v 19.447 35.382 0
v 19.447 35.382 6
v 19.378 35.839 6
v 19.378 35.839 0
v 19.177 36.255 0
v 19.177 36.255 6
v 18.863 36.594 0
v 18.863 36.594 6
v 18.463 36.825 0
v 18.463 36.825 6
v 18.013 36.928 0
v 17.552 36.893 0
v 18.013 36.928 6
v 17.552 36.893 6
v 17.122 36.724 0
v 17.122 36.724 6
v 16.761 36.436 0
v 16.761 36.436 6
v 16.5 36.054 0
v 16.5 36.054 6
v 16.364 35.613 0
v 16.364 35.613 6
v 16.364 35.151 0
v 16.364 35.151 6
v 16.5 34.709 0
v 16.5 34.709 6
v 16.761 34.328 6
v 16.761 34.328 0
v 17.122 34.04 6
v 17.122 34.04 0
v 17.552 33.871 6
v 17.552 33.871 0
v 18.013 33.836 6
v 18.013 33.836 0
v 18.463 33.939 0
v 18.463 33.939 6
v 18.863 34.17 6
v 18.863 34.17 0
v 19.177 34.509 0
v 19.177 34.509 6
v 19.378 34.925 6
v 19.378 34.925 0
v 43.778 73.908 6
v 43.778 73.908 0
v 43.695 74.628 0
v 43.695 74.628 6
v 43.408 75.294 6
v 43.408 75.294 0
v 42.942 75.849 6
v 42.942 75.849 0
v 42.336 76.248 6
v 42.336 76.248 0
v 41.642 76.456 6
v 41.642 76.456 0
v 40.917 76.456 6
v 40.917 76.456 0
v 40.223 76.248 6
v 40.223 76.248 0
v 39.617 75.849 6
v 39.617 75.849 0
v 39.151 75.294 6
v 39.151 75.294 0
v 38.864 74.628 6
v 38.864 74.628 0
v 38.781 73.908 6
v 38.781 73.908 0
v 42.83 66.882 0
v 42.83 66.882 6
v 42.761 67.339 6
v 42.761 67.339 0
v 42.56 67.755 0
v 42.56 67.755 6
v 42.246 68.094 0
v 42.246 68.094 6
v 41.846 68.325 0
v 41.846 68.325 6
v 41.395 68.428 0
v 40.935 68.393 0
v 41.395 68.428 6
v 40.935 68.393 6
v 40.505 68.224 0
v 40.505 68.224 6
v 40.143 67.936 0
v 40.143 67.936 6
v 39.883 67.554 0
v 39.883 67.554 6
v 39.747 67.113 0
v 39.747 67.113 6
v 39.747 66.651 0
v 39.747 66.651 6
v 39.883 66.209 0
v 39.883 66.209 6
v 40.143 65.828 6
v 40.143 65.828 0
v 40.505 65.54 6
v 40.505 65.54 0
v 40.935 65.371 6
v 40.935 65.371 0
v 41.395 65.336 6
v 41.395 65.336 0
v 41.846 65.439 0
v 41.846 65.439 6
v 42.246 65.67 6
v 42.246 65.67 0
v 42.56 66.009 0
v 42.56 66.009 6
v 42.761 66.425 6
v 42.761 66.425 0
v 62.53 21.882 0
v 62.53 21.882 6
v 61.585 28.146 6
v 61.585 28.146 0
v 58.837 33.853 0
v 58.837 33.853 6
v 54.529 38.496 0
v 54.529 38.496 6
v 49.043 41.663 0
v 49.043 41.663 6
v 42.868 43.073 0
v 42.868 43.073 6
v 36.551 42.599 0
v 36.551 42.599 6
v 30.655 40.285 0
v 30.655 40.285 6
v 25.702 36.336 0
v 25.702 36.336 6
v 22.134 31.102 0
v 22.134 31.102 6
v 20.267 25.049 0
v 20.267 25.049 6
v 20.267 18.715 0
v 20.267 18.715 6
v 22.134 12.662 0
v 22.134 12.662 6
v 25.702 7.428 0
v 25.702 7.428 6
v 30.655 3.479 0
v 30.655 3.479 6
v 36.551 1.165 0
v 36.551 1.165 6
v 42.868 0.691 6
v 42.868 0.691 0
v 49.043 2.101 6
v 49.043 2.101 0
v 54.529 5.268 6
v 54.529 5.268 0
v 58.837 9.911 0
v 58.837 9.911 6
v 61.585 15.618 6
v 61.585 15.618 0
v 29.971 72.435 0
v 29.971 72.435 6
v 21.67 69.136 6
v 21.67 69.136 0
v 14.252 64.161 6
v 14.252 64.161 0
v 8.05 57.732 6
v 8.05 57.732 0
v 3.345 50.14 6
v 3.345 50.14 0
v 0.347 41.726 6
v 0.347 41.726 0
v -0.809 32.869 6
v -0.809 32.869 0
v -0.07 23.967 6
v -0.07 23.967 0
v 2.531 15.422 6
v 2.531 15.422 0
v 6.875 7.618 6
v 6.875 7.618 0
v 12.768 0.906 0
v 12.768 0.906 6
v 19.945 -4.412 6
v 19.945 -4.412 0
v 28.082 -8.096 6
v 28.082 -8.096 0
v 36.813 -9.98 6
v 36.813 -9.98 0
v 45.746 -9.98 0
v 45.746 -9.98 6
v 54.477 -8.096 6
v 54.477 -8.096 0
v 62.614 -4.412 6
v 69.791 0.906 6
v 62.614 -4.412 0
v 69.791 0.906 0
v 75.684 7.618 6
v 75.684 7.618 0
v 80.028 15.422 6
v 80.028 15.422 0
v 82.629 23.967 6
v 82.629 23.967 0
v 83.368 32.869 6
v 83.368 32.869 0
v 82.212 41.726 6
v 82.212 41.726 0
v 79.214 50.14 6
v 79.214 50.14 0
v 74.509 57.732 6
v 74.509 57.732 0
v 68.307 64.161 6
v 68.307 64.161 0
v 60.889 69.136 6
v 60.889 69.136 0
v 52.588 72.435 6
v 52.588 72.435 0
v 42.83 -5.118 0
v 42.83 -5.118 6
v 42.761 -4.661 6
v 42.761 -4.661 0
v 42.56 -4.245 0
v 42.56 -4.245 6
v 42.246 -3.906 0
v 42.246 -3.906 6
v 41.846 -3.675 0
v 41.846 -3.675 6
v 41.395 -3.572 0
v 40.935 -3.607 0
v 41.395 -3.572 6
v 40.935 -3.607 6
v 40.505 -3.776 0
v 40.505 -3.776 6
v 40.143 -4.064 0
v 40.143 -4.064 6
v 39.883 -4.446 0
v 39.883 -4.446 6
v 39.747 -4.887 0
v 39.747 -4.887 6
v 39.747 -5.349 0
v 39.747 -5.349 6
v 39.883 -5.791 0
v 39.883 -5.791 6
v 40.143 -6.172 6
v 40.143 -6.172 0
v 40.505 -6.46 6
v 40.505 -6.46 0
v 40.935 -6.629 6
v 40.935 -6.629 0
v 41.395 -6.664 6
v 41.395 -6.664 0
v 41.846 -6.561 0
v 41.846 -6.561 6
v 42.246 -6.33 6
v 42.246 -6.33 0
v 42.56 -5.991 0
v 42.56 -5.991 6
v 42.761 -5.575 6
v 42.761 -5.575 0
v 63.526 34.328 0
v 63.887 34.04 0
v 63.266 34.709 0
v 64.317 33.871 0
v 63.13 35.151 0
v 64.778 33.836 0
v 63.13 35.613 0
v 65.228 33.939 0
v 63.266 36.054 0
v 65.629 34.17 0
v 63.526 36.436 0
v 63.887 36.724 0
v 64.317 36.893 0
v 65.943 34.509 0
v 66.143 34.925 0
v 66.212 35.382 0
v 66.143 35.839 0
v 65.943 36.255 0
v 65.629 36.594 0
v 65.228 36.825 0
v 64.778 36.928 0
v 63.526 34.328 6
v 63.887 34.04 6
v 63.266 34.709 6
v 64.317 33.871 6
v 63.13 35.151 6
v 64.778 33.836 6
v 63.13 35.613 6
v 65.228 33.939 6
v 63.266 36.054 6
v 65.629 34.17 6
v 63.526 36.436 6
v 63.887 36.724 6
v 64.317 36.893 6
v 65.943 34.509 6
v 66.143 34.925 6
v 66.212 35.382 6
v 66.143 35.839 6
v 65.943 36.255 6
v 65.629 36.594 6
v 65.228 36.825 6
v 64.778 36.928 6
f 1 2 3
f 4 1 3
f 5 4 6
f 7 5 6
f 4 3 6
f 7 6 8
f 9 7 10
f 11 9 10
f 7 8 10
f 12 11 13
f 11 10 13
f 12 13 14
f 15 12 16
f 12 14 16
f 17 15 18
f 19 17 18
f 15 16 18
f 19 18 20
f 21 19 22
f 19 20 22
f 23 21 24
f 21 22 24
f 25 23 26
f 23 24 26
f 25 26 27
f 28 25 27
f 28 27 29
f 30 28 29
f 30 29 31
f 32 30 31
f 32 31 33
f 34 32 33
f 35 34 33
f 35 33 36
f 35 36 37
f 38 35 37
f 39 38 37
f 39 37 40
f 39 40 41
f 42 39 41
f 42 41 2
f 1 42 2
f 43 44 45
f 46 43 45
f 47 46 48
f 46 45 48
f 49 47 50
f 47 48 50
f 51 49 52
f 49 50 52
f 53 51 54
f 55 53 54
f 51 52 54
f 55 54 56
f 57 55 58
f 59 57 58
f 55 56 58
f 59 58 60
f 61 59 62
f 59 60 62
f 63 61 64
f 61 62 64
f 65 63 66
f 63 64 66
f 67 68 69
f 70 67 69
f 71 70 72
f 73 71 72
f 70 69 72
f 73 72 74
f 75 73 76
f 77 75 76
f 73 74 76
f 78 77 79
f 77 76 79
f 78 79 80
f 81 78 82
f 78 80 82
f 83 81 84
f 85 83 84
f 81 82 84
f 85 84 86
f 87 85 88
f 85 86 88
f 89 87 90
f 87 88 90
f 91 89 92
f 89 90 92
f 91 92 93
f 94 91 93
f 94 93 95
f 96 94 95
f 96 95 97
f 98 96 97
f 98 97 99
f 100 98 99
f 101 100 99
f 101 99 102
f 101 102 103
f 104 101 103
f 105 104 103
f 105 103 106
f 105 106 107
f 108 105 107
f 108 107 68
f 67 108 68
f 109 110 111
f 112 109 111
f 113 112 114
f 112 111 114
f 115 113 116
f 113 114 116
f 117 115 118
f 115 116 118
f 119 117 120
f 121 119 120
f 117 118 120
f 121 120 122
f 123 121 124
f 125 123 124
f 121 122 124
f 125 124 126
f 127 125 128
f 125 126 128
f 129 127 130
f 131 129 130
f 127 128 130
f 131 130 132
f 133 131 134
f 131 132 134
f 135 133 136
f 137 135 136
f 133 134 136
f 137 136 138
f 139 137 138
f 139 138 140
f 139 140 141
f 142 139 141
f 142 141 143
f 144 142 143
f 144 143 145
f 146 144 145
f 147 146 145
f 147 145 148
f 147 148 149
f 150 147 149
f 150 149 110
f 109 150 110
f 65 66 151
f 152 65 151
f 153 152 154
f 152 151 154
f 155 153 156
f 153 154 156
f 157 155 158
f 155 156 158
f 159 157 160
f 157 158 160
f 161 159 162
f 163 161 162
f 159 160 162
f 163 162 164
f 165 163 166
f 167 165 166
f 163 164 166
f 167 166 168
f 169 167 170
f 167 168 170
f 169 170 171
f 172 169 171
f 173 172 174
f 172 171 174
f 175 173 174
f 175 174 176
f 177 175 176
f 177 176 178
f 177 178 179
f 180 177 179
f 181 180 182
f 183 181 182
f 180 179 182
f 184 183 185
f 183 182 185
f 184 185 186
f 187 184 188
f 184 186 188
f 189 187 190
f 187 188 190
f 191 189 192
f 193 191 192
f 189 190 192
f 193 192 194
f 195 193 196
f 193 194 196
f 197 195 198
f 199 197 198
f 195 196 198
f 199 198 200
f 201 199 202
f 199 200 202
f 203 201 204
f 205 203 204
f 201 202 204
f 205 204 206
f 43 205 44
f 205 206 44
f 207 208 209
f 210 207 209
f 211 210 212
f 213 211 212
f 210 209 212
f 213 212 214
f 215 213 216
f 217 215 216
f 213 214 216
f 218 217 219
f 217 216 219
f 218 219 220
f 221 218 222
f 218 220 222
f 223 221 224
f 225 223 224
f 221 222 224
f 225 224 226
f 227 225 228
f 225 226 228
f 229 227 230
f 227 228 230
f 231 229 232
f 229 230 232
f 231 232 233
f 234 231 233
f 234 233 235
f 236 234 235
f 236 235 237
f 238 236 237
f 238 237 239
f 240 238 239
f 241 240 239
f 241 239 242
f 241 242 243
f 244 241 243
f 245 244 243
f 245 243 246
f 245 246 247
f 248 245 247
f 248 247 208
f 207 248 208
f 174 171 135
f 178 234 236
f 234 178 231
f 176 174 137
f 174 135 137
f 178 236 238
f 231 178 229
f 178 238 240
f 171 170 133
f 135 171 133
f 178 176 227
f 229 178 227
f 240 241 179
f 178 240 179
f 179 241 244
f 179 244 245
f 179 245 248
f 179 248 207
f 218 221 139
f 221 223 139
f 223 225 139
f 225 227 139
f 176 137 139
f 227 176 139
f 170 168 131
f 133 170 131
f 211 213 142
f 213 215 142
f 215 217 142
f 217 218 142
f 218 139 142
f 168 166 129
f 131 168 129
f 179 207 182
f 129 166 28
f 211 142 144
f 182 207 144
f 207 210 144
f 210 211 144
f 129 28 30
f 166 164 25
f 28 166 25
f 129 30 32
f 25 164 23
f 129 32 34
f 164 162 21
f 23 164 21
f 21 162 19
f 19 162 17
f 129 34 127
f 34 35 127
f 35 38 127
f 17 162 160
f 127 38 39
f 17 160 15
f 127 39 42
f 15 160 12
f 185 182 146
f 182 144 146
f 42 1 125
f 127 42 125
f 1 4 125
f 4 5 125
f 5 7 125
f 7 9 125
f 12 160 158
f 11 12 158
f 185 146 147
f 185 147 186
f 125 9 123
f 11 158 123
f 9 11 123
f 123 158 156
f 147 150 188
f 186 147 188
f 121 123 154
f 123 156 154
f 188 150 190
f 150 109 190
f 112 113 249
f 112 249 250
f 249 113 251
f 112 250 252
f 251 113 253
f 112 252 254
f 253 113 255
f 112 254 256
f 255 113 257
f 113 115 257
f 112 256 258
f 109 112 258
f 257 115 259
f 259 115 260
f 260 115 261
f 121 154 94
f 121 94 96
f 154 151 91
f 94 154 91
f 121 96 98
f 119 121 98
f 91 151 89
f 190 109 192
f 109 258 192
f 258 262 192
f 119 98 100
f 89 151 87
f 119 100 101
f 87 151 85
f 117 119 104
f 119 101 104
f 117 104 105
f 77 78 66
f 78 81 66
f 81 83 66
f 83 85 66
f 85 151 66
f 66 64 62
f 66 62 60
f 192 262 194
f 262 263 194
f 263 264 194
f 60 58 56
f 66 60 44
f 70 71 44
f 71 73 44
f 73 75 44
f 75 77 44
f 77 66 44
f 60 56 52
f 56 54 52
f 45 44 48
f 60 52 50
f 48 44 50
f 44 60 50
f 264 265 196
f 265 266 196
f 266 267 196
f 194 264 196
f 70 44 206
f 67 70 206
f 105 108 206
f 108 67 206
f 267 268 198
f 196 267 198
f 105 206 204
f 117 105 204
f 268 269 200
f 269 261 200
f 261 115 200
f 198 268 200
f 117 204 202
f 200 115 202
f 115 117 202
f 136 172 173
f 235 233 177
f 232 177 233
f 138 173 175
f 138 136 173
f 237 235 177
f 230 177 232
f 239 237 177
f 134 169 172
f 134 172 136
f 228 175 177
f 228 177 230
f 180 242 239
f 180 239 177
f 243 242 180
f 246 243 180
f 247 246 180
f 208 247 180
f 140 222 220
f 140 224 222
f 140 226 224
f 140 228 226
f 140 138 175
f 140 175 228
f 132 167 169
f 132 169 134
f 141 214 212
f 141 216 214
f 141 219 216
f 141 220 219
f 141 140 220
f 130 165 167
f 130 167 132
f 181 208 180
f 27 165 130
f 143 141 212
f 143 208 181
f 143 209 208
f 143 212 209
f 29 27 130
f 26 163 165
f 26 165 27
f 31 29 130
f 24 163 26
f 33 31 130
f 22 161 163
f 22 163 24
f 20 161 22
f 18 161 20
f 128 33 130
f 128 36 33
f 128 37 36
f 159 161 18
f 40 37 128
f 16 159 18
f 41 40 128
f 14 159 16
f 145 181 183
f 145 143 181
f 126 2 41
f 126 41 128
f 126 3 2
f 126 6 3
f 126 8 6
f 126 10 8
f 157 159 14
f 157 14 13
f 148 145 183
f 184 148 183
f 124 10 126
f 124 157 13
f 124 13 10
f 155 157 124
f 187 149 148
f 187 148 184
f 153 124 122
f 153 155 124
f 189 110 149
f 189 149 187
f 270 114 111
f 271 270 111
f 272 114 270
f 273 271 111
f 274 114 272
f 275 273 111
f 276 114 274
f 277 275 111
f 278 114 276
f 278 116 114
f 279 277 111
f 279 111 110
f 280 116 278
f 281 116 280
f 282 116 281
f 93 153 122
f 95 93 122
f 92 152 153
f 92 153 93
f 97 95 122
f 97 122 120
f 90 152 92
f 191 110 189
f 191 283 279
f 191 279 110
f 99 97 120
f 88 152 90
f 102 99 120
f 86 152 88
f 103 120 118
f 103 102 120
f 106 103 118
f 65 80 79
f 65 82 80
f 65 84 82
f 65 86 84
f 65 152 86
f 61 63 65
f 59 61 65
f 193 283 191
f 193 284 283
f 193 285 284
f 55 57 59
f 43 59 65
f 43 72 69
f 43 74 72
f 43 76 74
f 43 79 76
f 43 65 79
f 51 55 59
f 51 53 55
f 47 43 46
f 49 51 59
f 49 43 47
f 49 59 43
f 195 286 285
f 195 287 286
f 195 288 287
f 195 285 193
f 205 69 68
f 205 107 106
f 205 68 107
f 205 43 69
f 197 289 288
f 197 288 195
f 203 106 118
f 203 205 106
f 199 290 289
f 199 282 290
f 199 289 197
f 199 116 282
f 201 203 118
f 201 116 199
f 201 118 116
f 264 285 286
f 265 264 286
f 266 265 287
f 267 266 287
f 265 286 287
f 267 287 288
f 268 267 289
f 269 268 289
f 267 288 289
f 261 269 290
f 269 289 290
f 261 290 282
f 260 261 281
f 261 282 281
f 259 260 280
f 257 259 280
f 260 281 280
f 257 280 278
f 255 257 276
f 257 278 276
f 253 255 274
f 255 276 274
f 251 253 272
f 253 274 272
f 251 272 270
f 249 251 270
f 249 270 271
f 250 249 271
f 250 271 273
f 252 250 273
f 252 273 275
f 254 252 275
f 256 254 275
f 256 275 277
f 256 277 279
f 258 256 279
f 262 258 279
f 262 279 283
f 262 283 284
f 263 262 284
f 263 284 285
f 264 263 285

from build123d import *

# Parameters (mm, degrees)
DODANIE_WYCI_GNI_CIE1_DEPTH = 6
SZKIC3_R                    = 21.25
WYTNIJ_WYCI_GNI_CIE1_DEPTH  = 10
SZKIC4_R                    = 1.55
WYTNIJ_WYCI_GNI_CIE2_DEPTH  = 10


with BuildPart() as part:
    # Szkic1 → Dodanie-wyciągnięcie1 (new body)
    with BuildSketch(Plane.XY):
        with BuildLine():
            ThreePointArc((38.780616011, 73.907751151), (41.279513808, -10.21802082), (43.778411605, 73.907751151))
            ThreePointArc((43.778411605, 73.907751151), (41.279513808, 76.48197918), (38.780616011, 73.907751151))
        make_face()
    extrude(amount=DODANIE_WYCI_GNI_CIE1_DEPTH)

    # Szkic3 → Wytnij-wyciągnięcie1 (cut)
    with BuildSketch(Plane.XY.offset(6)):
        with Locations((41.279513808, 21.88197918)):
            Circle(SZKIC3_R)
    extrude(amount=-WYTNIJ_WYCI_GNI_CIE1_DEPTH, mode=Mode.SUBTRACT)

    # Szkic4 → Wytnij-wyciągnięcie2 (cut)
    with BuildSketch(Plane.XY.offset(6)):
        with Locations((41.279513808, -5.11802082)):
            Circle(SZKIC4_R)
        with Locations((17.896827906, 35.38197918)):
            Circle(SZKIC4_R)
        with Locations((64.66219971, 35.38197918)):
            Circle(SZKIC4_R)
        with Locations((41.279513808, 66.88197918)):
            Circle(SZKIC4_R)
    extrude(amount=-WYTNIJ_WYCI_GNI_CIE2_DEPTH, mode=Mode.SUBTRACT)


solid = part.part
